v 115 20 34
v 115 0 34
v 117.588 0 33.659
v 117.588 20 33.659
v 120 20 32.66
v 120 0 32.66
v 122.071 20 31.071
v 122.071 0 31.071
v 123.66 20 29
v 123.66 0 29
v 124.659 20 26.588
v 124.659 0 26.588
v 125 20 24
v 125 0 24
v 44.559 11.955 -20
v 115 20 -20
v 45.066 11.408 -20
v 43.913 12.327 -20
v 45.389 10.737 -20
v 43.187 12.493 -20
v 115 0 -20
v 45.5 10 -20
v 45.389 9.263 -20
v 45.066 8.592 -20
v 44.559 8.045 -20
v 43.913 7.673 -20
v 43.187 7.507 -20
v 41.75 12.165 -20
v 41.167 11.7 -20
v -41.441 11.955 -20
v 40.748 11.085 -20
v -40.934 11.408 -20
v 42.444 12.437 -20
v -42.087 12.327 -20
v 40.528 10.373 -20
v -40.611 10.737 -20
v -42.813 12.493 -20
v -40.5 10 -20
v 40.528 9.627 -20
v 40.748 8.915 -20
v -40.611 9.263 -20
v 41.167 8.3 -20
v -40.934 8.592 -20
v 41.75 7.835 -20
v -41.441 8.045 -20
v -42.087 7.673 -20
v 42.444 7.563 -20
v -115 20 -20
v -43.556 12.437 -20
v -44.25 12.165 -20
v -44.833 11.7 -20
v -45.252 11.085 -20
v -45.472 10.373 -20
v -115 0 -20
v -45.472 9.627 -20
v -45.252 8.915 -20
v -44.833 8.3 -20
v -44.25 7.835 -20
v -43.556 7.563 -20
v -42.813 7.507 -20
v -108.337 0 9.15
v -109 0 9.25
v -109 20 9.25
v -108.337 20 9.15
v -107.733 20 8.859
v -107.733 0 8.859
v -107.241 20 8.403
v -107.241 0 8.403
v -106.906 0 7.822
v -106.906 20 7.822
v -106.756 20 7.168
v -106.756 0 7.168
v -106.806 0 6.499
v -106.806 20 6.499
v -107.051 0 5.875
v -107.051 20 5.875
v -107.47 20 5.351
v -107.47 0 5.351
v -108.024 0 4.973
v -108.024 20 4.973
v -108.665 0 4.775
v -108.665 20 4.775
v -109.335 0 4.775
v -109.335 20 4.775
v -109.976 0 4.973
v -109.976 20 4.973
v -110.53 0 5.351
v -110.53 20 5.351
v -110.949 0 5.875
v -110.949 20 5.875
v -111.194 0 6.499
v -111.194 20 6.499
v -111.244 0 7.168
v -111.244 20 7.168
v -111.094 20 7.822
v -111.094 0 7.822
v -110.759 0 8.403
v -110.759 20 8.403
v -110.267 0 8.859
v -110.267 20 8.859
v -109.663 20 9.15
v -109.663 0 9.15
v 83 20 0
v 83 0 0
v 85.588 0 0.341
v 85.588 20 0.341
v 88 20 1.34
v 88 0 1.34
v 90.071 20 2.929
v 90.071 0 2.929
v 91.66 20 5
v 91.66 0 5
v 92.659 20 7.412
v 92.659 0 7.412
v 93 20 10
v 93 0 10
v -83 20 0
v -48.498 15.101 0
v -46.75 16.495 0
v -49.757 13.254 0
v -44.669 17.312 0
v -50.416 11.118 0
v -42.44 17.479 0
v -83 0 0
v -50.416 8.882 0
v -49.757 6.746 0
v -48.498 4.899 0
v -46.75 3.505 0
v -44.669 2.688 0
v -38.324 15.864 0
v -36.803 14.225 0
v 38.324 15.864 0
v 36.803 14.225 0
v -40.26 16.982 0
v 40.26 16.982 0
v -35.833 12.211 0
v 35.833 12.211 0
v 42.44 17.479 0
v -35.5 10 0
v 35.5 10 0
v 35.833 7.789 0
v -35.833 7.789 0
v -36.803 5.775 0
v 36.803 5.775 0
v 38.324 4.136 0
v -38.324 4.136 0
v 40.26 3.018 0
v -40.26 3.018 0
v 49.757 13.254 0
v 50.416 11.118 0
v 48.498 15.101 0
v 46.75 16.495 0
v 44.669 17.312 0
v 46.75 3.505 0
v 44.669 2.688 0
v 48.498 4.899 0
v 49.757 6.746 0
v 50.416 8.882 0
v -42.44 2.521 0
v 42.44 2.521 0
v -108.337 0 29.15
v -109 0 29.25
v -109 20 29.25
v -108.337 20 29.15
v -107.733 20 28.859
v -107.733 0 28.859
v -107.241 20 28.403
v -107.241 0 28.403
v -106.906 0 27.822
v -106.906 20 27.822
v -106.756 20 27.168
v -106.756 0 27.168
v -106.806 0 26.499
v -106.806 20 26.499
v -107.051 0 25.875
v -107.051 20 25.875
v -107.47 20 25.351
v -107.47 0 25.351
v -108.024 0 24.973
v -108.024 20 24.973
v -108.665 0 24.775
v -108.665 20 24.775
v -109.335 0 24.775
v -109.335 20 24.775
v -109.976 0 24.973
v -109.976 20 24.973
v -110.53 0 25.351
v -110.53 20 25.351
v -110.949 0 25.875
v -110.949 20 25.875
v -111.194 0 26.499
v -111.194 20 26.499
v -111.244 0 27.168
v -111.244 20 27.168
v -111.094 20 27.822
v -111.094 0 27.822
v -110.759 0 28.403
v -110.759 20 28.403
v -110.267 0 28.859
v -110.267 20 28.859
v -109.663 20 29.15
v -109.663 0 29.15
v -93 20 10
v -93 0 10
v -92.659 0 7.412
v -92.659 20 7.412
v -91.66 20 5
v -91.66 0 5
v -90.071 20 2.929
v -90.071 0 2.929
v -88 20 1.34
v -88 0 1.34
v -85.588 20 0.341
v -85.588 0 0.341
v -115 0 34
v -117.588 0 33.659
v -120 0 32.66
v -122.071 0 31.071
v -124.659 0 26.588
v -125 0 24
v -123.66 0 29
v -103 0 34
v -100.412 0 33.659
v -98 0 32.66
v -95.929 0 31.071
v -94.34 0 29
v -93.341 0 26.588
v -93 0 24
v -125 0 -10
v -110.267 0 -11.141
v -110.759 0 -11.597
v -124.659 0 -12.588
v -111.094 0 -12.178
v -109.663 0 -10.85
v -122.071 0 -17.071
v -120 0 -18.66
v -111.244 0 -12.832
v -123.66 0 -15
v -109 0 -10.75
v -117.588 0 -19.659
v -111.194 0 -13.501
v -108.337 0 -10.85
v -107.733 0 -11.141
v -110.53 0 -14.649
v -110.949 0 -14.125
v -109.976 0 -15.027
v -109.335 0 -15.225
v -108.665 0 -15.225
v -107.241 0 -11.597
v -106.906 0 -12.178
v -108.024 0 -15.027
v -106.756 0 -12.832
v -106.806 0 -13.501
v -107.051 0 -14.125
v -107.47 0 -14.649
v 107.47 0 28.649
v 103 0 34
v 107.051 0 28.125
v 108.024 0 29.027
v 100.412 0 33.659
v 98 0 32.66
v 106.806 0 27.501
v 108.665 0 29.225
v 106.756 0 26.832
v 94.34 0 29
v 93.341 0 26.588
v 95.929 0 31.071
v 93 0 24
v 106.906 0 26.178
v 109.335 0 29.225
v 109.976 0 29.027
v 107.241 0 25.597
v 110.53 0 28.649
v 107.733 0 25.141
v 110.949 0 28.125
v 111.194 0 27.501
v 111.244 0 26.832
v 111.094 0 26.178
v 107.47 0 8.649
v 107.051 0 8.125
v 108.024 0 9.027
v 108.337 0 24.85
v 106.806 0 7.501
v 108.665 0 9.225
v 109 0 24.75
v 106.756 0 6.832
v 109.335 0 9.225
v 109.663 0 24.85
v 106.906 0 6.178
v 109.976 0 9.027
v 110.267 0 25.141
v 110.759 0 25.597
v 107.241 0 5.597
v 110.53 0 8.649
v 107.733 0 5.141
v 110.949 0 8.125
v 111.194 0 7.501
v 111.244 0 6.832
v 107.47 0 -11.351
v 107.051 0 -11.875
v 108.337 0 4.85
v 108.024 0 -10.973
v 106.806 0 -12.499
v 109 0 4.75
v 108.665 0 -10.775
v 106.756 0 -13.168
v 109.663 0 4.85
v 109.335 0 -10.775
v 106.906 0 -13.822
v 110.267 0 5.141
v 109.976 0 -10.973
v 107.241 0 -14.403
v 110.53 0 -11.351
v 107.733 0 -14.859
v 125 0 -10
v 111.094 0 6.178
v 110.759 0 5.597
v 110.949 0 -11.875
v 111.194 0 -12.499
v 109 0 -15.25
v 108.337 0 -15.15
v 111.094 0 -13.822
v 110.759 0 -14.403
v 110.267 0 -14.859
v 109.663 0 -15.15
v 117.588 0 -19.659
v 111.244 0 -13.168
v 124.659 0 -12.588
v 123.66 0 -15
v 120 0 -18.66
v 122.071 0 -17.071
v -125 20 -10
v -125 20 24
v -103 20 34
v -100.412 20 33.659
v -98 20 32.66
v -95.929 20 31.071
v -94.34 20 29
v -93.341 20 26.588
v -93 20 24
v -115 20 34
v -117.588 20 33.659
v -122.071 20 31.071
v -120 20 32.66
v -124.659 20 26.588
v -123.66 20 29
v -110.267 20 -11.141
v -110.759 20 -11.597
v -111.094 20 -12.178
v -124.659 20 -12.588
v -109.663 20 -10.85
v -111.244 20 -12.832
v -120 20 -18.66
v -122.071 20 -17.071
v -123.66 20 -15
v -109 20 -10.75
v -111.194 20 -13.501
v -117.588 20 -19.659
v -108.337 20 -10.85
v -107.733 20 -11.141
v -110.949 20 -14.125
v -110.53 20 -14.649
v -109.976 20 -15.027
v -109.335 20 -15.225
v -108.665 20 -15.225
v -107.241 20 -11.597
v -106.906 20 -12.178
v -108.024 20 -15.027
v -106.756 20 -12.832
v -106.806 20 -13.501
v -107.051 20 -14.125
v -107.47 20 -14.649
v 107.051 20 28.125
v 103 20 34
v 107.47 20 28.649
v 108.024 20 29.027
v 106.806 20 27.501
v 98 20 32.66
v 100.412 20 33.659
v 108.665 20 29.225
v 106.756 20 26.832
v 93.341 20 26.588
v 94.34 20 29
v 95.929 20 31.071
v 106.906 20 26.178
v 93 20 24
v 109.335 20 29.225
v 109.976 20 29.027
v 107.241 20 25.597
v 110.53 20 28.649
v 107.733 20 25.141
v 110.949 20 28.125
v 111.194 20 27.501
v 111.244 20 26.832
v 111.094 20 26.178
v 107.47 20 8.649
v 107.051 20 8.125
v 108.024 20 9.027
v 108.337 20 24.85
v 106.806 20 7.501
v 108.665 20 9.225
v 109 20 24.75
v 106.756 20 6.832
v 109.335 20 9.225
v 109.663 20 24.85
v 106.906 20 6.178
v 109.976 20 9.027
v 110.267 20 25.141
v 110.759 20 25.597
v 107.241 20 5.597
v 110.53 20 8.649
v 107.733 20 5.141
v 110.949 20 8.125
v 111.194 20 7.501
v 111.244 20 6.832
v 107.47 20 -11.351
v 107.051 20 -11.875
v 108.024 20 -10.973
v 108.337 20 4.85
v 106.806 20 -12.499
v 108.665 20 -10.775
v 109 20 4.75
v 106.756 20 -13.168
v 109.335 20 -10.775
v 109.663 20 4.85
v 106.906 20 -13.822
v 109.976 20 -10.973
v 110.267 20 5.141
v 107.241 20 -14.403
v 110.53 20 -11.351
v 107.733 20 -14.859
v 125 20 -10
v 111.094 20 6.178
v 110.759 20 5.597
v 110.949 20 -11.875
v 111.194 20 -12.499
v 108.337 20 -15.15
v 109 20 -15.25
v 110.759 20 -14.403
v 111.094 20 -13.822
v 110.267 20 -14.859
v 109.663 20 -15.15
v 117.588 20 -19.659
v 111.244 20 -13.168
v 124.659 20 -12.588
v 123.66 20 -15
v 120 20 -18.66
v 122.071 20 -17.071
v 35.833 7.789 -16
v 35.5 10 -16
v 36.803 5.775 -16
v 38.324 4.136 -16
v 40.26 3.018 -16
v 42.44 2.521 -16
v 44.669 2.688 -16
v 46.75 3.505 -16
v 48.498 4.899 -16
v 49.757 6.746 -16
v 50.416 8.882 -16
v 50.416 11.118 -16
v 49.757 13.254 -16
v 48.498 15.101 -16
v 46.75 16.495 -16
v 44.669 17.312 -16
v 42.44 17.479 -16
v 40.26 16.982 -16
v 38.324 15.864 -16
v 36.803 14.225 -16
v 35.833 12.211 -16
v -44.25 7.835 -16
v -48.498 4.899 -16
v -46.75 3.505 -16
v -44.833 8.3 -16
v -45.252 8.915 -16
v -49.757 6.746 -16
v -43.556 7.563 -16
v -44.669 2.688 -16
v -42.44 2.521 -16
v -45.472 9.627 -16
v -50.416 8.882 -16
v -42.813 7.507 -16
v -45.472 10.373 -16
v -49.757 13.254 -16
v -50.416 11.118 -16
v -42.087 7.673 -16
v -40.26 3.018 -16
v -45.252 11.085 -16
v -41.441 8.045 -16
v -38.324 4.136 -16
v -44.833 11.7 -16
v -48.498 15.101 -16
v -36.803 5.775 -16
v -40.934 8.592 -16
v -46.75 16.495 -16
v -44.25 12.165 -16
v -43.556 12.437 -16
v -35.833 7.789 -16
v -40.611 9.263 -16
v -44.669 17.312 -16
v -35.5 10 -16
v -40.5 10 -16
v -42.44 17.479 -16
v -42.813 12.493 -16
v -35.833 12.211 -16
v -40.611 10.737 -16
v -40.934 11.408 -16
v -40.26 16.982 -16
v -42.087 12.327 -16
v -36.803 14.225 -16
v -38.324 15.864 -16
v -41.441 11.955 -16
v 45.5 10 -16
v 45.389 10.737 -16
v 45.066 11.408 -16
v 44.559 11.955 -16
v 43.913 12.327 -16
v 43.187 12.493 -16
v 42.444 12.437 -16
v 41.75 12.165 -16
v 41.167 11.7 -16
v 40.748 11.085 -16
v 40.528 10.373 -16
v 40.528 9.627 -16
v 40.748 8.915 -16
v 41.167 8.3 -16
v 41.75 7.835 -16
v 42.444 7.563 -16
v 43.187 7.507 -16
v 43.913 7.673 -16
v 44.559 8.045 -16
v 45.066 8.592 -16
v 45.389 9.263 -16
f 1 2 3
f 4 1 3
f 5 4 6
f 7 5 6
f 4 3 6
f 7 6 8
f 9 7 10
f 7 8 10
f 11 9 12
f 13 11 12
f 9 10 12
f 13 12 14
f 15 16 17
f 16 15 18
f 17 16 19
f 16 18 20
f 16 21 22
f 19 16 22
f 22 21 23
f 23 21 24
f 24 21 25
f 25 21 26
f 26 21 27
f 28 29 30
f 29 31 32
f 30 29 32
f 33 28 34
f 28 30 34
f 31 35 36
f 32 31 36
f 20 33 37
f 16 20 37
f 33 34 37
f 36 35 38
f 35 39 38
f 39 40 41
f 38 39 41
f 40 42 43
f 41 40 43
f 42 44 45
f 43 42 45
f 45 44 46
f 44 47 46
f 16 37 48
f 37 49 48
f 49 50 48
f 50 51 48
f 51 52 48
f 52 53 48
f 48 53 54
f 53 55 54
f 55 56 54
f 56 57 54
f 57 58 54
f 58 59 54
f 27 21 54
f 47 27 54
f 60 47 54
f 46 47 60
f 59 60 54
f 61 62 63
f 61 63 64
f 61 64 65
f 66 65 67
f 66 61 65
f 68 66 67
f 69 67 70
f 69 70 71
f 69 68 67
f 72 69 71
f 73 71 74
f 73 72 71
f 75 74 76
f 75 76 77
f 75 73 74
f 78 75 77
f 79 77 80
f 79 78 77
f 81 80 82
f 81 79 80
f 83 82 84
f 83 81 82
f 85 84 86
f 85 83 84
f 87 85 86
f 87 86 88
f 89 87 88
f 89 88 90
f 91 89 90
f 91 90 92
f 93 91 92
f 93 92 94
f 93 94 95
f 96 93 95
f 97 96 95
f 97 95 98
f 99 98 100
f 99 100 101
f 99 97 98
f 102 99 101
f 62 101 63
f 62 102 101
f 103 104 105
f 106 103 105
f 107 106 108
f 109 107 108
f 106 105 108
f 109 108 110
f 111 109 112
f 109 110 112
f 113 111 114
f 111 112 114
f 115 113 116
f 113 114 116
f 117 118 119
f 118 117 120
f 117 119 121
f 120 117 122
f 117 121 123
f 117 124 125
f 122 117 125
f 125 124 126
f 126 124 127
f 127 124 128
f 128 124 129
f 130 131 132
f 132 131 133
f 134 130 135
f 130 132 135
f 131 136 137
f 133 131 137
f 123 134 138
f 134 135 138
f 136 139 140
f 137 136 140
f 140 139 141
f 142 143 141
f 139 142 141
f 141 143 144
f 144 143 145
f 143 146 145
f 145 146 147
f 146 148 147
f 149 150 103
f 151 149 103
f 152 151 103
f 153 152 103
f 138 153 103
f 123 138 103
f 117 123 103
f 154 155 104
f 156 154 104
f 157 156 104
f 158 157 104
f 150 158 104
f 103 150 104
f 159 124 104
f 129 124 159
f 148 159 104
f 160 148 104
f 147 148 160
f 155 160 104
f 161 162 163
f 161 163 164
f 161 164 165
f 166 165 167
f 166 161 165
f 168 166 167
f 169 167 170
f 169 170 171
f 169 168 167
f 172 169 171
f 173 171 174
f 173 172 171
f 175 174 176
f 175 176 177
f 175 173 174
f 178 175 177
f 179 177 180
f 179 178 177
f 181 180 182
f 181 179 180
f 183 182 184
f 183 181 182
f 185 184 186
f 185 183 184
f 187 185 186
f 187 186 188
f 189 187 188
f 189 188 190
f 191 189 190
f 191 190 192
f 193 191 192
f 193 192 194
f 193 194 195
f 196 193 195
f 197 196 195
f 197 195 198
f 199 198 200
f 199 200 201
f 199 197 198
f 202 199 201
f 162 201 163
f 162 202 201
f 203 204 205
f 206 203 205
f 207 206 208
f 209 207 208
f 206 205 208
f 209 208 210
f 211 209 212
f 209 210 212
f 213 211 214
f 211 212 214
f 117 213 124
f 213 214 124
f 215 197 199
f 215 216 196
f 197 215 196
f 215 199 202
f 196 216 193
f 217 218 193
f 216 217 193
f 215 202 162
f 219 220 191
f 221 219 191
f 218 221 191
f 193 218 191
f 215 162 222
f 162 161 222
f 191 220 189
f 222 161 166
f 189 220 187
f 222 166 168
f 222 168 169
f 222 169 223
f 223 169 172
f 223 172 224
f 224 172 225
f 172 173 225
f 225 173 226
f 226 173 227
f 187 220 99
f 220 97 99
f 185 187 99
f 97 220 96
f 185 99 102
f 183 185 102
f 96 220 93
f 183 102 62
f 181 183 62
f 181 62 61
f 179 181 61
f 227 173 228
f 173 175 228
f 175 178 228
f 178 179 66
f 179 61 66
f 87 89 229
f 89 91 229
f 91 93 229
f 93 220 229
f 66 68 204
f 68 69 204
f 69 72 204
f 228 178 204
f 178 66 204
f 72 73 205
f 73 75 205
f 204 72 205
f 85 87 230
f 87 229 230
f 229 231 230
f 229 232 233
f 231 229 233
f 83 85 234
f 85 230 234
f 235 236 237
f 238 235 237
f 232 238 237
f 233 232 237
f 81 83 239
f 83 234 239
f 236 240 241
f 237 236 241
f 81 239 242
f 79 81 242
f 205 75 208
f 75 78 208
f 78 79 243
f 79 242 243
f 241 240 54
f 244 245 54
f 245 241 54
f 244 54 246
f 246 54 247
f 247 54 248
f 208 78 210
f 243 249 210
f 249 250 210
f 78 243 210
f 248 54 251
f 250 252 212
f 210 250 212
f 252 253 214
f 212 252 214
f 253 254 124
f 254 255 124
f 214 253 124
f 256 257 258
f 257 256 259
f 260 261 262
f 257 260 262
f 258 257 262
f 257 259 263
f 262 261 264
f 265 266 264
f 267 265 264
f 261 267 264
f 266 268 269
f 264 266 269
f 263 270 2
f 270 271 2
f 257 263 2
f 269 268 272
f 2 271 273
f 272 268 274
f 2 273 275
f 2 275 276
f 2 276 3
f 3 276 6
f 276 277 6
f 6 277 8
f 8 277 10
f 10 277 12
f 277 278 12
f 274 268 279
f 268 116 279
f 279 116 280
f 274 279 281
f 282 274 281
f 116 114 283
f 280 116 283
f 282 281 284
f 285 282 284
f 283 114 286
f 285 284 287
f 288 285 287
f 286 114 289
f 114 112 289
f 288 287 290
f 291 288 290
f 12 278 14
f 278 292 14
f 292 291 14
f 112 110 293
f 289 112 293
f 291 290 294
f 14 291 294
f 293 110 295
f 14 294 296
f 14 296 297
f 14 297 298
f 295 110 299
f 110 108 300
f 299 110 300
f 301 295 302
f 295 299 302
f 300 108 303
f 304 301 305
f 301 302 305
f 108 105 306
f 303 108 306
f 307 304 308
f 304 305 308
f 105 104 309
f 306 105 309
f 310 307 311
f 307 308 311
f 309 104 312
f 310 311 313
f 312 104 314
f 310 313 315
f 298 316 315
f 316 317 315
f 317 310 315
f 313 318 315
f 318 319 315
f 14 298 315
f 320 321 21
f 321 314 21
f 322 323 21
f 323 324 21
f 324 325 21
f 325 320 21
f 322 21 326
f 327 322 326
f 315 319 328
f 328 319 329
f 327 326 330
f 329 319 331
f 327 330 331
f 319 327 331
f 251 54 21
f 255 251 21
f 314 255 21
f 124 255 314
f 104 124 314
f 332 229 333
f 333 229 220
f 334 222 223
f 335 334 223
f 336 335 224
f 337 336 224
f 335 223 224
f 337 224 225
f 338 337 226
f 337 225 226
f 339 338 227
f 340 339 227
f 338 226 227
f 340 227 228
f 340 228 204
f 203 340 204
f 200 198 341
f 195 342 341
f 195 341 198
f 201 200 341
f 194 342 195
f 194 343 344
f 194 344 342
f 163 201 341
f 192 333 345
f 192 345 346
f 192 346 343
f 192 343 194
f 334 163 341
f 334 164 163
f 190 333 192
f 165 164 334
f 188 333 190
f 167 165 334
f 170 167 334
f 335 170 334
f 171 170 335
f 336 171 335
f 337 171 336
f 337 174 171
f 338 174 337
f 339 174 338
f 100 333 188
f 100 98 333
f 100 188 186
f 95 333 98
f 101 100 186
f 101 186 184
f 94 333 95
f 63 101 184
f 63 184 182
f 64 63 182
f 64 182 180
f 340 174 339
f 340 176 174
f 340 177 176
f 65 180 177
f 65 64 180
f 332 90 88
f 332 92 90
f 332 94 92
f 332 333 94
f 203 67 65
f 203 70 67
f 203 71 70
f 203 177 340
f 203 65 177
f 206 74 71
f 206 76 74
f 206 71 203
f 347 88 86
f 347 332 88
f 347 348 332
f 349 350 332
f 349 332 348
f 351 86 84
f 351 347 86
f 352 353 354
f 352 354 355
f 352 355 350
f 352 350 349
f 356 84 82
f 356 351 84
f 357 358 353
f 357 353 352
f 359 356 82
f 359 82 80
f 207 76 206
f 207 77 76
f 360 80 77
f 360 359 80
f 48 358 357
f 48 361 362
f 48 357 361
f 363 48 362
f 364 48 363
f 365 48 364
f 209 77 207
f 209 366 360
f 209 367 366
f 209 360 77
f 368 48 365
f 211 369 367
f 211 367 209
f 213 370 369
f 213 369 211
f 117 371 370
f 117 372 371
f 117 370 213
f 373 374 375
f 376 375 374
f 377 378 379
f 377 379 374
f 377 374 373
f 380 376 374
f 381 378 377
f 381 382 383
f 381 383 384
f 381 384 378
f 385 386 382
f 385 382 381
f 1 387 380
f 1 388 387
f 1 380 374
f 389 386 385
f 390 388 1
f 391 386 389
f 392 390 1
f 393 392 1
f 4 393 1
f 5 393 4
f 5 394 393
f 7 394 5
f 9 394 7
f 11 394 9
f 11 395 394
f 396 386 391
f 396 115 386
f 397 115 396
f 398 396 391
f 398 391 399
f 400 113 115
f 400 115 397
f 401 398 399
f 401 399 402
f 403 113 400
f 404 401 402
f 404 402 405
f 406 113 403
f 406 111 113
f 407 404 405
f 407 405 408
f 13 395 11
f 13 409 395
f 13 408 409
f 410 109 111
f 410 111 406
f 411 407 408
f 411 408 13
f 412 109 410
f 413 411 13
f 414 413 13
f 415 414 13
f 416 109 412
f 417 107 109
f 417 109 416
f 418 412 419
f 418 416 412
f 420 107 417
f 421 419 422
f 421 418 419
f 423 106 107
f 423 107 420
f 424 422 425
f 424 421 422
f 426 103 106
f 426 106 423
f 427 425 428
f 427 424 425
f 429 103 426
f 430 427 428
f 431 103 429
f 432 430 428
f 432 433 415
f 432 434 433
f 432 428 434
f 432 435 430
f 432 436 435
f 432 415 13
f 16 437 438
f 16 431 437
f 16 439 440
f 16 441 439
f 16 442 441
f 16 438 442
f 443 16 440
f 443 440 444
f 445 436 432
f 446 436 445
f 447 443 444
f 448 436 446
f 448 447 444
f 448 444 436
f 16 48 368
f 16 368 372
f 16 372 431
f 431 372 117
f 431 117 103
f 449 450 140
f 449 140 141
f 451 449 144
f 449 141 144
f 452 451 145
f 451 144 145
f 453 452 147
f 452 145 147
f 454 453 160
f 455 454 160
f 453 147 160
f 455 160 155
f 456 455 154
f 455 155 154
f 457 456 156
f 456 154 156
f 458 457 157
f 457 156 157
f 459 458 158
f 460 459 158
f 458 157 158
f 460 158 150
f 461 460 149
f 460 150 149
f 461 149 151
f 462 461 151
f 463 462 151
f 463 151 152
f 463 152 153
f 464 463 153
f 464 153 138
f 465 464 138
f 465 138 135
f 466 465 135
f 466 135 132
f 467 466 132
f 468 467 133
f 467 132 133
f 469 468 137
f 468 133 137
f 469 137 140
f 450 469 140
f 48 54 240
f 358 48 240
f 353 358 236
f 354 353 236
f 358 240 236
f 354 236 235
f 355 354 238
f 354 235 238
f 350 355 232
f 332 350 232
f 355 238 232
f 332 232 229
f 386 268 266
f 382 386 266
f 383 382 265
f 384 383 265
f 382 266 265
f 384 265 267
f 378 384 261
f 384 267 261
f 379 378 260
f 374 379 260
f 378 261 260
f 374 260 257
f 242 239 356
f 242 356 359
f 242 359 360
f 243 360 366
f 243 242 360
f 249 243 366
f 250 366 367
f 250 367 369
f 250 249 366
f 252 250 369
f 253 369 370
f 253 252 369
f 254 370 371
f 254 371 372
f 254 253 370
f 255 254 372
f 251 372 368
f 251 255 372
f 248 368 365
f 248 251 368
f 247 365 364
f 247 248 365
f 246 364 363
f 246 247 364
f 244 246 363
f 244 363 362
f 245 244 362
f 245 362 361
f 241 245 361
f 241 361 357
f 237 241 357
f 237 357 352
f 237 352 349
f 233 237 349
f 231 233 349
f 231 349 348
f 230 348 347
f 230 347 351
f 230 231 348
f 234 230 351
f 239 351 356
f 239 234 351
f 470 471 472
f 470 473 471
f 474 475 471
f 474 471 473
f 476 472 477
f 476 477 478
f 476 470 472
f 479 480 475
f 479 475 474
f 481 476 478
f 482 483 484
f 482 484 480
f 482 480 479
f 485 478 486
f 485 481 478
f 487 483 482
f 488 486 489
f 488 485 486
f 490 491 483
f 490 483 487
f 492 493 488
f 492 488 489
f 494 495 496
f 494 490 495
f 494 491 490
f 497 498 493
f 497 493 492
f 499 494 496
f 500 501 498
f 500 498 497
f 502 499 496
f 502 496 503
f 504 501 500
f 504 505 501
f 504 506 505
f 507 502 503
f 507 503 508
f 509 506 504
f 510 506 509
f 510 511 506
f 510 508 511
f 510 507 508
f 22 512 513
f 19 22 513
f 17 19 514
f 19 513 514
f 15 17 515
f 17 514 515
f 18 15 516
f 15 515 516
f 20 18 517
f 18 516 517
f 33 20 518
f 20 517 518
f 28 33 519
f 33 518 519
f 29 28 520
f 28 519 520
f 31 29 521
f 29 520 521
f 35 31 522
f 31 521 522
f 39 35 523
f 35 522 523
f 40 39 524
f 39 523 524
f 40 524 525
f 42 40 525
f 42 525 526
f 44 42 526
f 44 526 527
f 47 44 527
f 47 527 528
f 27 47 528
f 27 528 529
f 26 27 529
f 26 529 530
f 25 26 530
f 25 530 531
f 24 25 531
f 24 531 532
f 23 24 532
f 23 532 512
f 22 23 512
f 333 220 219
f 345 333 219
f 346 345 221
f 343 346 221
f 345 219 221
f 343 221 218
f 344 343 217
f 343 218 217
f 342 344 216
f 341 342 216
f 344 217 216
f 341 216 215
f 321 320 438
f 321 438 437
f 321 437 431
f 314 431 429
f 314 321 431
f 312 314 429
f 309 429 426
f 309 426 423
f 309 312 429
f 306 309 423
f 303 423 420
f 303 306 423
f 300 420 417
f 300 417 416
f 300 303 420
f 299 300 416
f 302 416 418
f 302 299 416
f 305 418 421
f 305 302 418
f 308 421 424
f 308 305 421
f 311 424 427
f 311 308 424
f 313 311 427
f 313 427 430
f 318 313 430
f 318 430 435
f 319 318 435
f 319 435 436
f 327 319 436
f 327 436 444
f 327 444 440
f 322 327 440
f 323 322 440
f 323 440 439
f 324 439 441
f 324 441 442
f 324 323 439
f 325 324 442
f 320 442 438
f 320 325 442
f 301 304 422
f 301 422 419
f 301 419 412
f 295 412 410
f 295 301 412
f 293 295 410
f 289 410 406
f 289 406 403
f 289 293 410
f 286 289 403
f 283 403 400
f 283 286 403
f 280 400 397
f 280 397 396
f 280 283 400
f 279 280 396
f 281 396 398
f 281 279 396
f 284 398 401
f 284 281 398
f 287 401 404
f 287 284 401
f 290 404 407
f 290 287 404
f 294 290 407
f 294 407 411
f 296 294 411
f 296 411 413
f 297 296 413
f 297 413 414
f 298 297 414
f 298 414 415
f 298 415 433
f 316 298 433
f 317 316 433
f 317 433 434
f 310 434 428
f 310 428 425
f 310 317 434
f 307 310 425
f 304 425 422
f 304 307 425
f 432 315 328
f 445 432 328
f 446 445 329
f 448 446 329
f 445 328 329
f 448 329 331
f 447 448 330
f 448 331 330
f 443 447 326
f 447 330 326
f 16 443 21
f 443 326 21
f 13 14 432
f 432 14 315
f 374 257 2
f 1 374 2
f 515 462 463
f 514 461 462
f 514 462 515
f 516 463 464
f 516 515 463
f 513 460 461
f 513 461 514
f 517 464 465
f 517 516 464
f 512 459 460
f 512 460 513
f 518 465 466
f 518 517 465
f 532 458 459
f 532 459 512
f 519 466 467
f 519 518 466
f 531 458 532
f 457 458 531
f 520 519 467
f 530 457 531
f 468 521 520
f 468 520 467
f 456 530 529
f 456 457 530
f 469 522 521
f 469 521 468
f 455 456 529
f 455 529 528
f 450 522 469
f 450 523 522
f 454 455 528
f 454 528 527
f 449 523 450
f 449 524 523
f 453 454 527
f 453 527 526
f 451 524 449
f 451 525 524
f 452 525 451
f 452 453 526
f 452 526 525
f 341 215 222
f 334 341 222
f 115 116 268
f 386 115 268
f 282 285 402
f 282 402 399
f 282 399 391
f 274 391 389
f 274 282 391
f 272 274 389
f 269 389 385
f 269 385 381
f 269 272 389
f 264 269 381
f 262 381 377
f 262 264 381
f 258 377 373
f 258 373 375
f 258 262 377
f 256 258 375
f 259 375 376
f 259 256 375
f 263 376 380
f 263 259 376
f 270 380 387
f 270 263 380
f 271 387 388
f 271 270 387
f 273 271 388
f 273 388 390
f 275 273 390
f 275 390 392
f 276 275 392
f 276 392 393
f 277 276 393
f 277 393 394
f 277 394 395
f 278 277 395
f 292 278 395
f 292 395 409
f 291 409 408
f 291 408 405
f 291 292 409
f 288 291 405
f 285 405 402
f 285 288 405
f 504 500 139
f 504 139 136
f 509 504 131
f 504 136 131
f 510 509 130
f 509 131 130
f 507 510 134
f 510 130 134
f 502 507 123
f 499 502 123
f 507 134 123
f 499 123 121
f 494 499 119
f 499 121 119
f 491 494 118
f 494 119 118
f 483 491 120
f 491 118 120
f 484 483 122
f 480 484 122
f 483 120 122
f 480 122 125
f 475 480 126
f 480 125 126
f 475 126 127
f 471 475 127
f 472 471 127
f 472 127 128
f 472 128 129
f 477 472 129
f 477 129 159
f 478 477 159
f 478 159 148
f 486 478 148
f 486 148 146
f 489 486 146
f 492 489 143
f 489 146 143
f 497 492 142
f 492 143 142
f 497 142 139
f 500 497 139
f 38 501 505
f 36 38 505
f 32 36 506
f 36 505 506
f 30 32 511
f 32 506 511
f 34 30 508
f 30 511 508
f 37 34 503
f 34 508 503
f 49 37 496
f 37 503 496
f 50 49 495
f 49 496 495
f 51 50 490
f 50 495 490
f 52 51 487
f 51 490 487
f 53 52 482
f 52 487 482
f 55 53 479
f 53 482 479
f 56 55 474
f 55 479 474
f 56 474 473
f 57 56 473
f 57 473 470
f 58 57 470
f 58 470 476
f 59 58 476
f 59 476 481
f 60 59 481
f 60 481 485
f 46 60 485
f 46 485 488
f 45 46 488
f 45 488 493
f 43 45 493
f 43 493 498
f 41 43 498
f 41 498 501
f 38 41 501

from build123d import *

# Parameters (mm, degrees)
SKETCH1_R           = 2.25
BOSS_EXTRUDE1_DEPTH = 20
SKETCH6_R           = 7.5
CUT_EXTRUDE1_DEPTH  = 16
CUT_EXTRUDE2_REACH  = 6
SKETCH7_R           = 2.5


with BuildPart() as part:
    # Sketch1 → Boss-Extrude1 (new body)
    with BuildSketch(Plane(origin=(0, 0, 0), x_dir=(1, 0, 0), z_dir=(0, 1, 0))):
        with BuildLine():
            Line((115, 20), (-115, 20))
            ThreePointArc((-115, 20), (-122.071067812, 17.071067812), (-125, 10))
            Line((-125, 10), (-125, -24))
            ThreePointArc((-125, -24), (-122.071067812, -31.071067812), (-115, -34))
            Line((-115, -34), (-103, -34))
            ThreePointArc((-103, -34), (-95.928932188, -31.071067812), (-93, -24))
            Line((-93, -24), (-93, -10))
            ThreePointArc((-93, -10), (-90.071067812, -2.928932188), (-83, 0))
            Line((-83, 0), (-30, 0))
            Line((-30, 0), (30, 0))
            Line((30, 0), (83, 0))
            ThreePointArc((83, 0), (90.071067812, -2.928932188), (93, -10))
            Line((93, -10), (93, -24))
            ThreePointArc((93, -24), (95.928932188, -31.071067812), (103, -34))
            Line((103, -34), (115, -34))
            ThreePointArc((115, -34), (122.071067812, -31.071067812), (125, -24))
            Line((125, -24), (125, 10))
            ThreePointArc((125, 10), (122.071067812, 17.071067812), (115, 20))
        make_face()
        with Locations(Location((-109, 13, 0), (0, 0, 270))):  # turned: the seam where the file's is
            Circle(SKETCH1_R, mode=Mode.SUBTRACT)
        with Locations(Location((-109, -7, 0), (0, 0, 270))):  # turned: the seam where the file's is
            Circle(SKETCH1_R, mode=Mode.SUBTRACT)
        with Locations(Location((-109, -27, 0), (0, 0, 270))):  # turned: the seam where the file's is
            Circle(SKETCH1_R, mode=Mode.SUBTRACT)
        with Locations(Location((109, -27, 0), (0, 0, 90))):  # turned: the seam where the file's is
            Circle(SKETCH1_R, mode=Mode.SUBTRACT)
        with Locations(Location((109, -7, 0), (0, 0, 90))):  # turned: the seam where the file's is
            Circle(SKETCH1_R, mode=Mode.SUBTRACT)
        with Locations(Location((109, 13, 0), (0, 0, 90))):  # turned: the seam where the file's is
            Circle(SKETCH1_R, mode=Mode.SUBTRACT)
    extrude(amount=BOSS_EXTRUDE1_DEPTH)

    # Sketch6 → Cut-Extrude1 (cut)
    with BuildSketch(Plane.XY):
        with Locations((-43, 10)):
            Circle(SKETCH6_R)
        with Locations(Location((43, 10, 0), (0, 0, 180))):  # turned: the seam where the file's is
            Circle(SKETCH6_R)
    extrude(amount=-CUT_EXTRUDE1_DEPTH, mode=Mode.SUBTRACT)

    # Sketch7 → Cut-Extrude2 (cut, up to next)
    with BuildSketch(Plane.XY.offset(-16), mode=Mode.PRIVATE) as cut_extrude2_sk1:
        with Locations((-43, 10)):
            Circle(SKETCH7_R)
    cut_extrude2_tool1 = extrude(cut_extrude2_sk1.sketch, amount=-CUT_EXTRUDE2_REACH, mode=Mode.PRIVATE) & part.part
    add(cut_extrude2_tool1.solids().sort_by_distance((-43, 10, -16))[0], mode=Mode.SUBTRACT)
    # Sketch7 → Cut-Extrude2 (cut, up to next)
    with BuildSketch(Plane.XY.offset(-16), mode=Mode.PRIVATE) as cut_extrude2_sk2:
        with Locations((43, 10)):
            Circle(SKETCH7_R)
    cut_extrude2_tool2 = extrude(cut_extrude2_sk2.sketch, amount=-CUT_EXTRUDE2_REACH, mode=Mode.PRIVATE) & part.part
    add(cut_extrude2_tool2.solids().sort_by_distance((43, 10, -16))[0], mode=Mode.SUBTRACT)


solid = part.part
